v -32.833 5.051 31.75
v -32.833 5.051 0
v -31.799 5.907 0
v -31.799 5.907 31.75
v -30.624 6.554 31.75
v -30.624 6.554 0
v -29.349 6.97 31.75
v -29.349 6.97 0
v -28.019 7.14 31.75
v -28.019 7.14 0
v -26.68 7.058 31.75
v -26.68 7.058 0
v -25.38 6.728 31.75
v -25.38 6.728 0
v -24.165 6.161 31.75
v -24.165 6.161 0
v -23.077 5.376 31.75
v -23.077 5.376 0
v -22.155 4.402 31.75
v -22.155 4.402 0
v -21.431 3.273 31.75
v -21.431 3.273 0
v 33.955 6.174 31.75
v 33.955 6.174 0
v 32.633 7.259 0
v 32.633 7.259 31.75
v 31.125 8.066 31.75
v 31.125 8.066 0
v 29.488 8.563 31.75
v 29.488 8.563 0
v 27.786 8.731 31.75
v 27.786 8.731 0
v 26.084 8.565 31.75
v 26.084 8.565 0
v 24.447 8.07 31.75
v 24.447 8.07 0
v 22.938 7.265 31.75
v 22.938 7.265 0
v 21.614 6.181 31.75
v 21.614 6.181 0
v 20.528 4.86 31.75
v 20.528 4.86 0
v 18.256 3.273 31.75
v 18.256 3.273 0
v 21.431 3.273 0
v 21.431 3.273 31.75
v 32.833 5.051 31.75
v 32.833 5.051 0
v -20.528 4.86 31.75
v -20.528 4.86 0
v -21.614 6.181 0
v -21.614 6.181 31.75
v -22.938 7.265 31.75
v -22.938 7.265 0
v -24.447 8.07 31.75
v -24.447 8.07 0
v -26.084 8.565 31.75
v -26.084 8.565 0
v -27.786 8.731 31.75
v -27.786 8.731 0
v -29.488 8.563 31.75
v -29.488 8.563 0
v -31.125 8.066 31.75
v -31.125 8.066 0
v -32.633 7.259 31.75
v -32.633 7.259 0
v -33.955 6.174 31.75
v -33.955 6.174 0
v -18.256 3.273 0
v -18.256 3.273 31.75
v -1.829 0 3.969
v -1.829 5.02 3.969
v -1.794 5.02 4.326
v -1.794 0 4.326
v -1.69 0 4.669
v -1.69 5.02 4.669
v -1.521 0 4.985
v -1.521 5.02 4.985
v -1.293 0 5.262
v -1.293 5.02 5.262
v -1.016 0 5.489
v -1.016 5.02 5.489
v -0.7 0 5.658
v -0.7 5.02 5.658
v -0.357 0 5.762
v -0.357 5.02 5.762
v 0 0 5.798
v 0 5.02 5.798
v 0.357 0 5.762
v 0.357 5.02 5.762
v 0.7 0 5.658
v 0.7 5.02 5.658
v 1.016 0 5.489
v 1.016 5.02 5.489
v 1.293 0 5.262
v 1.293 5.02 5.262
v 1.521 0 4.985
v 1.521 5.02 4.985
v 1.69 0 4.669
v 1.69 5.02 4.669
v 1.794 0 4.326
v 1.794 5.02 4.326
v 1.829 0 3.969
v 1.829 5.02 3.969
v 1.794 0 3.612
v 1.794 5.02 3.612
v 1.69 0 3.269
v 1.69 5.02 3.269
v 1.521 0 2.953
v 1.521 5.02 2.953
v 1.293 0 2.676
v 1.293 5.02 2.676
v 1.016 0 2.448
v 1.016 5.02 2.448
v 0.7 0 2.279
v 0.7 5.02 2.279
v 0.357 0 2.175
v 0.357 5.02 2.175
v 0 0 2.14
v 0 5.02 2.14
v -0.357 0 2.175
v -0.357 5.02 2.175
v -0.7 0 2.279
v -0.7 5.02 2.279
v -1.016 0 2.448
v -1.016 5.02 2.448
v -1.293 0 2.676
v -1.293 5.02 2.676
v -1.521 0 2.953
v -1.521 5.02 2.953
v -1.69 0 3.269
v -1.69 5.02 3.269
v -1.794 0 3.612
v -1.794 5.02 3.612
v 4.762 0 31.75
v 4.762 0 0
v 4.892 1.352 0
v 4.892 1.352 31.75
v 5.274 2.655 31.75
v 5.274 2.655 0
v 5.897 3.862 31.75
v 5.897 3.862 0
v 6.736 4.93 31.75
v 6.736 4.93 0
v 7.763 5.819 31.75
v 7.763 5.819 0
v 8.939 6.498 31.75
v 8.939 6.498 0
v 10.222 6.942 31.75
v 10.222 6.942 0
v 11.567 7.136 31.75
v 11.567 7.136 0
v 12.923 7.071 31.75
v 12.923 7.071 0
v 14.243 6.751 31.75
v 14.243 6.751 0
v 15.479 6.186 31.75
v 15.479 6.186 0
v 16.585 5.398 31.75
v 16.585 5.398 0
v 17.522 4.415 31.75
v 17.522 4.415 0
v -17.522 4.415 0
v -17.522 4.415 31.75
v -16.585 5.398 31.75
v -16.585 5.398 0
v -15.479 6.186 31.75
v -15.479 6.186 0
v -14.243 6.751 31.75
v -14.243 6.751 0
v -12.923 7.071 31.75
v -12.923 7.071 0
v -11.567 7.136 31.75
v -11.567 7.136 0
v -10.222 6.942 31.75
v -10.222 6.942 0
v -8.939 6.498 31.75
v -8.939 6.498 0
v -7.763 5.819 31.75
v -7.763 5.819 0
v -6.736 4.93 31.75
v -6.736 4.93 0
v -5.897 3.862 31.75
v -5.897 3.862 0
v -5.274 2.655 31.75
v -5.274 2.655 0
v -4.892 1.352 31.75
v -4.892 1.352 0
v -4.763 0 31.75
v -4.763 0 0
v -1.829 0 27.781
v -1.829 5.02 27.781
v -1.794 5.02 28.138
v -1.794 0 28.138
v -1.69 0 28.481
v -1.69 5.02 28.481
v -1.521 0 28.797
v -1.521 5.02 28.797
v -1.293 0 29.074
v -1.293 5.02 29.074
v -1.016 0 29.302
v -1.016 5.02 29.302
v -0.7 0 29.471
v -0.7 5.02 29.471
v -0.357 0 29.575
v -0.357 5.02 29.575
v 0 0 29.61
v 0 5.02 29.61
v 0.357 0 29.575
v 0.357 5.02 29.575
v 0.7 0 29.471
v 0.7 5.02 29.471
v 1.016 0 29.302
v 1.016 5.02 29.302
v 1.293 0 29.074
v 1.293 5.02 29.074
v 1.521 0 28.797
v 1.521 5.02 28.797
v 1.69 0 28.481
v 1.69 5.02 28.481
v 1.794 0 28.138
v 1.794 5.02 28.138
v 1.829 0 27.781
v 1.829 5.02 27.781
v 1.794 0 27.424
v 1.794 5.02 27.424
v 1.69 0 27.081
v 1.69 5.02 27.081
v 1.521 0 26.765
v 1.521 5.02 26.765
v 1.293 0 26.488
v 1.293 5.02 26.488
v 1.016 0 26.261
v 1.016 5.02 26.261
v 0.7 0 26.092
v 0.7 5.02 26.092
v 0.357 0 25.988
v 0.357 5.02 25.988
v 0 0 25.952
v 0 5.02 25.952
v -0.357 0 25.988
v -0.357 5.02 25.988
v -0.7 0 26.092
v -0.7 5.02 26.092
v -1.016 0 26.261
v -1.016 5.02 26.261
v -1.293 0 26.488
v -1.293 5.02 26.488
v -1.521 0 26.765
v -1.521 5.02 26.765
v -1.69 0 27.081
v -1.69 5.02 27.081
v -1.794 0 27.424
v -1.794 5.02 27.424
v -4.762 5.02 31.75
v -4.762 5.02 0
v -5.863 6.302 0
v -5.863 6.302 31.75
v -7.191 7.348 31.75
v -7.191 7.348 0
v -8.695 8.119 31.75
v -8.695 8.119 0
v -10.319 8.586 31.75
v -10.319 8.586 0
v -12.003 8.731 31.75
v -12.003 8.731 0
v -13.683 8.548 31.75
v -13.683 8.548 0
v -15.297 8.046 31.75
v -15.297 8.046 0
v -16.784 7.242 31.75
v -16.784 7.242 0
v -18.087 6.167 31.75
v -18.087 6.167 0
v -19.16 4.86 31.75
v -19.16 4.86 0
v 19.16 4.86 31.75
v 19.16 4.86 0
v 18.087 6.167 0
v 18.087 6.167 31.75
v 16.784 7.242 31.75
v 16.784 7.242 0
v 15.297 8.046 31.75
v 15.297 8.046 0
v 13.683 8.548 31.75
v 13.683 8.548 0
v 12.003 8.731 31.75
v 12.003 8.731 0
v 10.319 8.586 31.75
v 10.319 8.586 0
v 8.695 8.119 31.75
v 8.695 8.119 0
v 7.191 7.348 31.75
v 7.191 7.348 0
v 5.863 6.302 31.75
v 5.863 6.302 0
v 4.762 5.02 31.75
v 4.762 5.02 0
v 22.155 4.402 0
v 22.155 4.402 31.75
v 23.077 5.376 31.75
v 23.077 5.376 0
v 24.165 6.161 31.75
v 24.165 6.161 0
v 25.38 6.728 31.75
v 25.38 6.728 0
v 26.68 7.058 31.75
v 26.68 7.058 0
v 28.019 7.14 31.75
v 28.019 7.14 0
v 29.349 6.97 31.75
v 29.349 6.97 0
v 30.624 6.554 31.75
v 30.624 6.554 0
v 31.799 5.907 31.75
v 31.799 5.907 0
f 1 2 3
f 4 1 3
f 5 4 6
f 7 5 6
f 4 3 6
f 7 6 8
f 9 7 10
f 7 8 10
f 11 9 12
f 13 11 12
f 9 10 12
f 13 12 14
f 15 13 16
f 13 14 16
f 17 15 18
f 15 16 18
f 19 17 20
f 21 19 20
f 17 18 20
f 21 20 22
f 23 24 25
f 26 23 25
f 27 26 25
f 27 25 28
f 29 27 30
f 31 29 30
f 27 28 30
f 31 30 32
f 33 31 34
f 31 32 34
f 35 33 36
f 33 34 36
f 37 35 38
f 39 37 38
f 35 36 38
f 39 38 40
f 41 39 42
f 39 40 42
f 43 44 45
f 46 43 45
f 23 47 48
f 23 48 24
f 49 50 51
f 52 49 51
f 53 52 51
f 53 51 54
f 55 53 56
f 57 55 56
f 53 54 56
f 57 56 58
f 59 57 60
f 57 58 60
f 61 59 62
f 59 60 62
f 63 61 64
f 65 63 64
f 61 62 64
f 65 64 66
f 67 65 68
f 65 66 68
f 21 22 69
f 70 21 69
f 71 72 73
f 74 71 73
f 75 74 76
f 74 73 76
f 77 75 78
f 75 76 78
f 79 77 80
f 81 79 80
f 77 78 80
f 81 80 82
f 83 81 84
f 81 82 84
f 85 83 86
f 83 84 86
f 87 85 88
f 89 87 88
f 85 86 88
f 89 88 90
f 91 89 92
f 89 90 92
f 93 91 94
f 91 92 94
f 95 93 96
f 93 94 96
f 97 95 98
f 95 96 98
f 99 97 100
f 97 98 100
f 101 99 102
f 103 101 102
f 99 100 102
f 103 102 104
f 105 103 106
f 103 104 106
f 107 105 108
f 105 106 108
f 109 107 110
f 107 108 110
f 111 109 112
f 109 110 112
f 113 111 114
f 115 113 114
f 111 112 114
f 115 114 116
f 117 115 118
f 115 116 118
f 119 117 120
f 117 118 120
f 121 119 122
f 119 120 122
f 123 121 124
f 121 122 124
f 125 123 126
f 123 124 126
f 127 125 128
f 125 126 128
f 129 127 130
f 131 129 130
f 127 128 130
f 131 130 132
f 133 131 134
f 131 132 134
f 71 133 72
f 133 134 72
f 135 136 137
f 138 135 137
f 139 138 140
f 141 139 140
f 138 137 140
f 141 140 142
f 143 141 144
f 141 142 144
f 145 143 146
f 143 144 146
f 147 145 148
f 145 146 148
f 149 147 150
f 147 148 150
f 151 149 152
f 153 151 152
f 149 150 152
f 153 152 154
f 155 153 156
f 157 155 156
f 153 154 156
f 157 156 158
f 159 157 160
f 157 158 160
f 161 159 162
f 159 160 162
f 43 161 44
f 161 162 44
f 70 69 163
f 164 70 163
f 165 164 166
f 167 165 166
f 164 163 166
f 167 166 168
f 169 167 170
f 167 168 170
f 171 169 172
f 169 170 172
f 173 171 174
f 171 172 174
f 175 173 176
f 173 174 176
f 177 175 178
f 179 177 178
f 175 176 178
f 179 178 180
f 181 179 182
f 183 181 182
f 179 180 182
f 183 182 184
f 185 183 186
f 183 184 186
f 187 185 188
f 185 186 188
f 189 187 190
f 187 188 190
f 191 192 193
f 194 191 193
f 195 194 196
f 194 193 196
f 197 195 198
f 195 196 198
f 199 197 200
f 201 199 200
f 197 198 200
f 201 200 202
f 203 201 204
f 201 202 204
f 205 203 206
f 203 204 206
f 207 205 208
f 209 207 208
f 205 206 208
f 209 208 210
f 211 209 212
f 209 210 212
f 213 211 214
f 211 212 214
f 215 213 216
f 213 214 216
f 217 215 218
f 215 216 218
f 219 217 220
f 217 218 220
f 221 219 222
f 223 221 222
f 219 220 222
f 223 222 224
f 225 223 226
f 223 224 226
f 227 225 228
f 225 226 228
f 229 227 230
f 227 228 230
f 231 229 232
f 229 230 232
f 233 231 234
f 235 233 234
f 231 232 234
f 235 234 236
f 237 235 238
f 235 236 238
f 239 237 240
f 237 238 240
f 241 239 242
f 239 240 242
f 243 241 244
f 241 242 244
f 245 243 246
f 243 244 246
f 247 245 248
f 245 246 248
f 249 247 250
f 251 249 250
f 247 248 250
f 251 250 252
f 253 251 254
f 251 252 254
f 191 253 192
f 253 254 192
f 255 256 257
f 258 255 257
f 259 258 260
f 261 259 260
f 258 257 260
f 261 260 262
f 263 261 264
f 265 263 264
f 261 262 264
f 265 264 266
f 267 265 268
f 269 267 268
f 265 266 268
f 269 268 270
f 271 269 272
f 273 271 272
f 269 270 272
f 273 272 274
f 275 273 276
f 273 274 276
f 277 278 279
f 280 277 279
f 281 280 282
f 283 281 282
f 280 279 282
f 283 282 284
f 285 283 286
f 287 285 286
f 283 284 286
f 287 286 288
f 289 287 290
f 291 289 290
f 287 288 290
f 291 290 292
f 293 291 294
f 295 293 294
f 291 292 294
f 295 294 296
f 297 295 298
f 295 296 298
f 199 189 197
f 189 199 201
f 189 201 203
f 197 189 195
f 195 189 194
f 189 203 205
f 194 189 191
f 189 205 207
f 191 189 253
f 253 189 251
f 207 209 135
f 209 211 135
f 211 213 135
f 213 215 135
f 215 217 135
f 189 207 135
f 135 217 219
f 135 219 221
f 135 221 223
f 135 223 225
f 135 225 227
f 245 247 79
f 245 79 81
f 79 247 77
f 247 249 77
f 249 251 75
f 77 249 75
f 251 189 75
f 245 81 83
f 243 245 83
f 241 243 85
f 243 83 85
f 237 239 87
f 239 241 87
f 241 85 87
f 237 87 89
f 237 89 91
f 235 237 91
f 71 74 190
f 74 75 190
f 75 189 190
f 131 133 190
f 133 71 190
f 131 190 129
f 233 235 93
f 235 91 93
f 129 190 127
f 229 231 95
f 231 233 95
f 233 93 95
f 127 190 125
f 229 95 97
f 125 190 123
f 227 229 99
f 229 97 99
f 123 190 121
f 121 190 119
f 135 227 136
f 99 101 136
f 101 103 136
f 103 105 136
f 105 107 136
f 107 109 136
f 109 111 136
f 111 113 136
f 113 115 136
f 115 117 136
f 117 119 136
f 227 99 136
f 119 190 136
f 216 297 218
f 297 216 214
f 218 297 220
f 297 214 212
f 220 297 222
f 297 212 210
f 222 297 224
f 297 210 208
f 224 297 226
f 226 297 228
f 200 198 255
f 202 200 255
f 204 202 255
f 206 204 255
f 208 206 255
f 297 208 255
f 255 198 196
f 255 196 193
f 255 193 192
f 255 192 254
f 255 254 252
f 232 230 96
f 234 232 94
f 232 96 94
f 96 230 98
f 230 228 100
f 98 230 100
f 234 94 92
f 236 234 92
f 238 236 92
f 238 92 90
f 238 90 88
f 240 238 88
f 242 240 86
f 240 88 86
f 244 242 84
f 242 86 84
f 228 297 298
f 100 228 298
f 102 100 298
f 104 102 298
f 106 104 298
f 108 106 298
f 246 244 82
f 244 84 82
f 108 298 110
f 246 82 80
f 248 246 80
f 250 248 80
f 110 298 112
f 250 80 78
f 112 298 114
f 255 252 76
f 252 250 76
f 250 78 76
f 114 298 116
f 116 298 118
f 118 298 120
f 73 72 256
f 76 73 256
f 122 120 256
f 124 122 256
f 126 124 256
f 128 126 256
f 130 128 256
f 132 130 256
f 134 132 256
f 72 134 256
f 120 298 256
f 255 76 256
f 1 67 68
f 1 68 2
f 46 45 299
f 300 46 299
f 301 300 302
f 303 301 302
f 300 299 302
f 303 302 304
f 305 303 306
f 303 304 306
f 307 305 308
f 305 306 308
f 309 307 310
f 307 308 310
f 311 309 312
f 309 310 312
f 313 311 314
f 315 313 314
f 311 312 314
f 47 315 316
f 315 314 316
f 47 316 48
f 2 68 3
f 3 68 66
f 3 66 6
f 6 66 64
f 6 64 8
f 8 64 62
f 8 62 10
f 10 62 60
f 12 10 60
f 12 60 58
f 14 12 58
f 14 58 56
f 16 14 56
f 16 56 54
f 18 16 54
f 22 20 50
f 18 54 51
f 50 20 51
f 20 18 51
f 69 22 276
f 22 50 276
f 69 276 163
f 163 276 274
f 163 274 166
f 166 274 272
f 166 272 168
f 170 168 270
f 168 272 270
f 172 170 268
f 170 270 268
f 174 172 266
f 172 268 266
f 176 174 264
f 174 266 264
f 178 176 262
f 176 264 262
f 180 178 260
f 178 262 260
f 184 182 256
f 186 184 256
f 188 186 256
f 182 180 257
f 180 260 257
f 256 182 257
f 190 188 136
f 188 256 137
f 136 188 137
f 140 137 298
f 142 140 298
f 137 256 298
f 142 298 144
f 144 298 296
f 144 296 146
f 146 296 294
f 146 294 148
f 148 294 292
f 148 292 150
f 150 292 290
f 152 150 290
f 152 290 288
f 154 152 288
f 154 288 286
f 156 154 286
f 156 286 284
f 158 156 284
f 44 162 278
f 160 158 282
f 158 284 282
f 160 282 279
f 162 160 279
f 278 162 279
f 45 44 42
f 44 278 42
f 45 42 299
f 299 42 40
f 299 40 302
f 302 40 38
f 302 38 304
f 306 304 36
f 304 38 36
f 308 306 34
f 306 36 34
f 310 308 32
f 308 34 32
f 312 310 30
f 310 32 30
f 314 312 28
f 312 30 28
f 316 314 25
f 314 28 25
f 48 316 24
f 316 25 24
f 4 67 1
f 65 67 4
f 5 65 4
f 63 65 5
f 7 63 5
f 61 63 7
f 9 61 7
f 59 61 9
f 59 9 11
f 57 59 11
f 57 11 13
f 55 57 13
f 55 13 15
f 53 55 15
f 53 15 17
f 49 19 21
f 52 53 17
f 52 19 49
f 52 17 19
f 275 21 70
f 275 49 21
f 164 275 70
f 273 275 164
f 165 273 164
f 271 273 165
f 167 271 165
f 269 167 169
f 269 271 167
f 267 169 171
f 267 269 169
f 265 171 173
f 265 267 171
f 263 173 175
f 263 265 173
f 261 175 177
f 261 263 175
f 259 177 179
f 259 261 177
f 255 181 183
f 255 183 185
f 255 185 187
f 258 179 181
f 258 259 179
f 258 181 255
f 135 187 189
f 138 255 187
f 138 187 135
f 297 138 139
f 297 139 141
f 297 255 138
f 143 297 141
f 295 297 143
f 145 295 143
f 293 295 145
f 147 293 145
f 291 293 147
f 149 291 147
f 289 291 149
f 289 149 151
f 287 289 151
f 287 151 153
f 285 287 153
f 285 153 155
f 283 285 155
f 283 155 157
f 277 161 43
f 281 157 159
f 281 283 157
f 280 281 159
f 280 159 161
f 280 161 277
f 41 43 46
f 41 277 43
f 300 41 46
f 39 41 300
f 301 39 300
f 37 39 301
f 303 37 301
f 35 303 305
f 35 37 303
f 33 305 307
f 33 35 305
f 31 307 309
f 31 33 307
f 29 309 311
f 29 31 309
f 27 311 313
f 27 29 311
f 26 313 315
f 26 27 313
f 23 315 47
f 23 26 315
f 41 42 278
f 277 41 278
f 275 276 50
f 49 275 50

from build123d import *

# Parameters (mm, degrees)
F1_DEPTH = 31.75
F2_R     = 1.8288
F3_DEPTH = 5.020116


with BuildPart() as f1:
    # F0 (on Top) → F1 (new body)
    with BuildSketch(Plane.XY):
        with BuildLine():
            ThreePointArc((-18.25625, 3.272715), (-10.222452, 6.942477), (-4.7625, 0))
            Line((-4.7625, 0), (4.7625, 0))
            ThreePointArc((4.7625, 0), (10.222452, 6.942477), (18.25625, 3.272715))
            Line((18.25625, 3.272715), (21.43125, 3.272715))
            ThreePointArc((21.43125, 3.272715), (26.680106, 7.058374), (32.832644, 5.051394))
            Line((32.832644, 5.051394), (33.955176, 6.173926))
            ThreePointArc((33.955176, 6.173926), (26.931061, 8.689759), (20.527766, 4.860215))
            Line((20.527766, 4.860215), (19.159734, 4.860215))
            ThreePointArc((19.159734, 4.860215), (12.003216, 8.730712), (4.7625, 5.020116))
            Line((4.7625, 5.020116), (-4.7625, 5.020116))
            ThreePointArc((-4.7625, 5.020116), (-12.003216, 8.730712), (-19.159734, 4.860215))
            Line((-19.159734, 4.860215), (-20.527766, 4.860215))
            ThreePointArc((-20.527766, 4.860215), (-26.931061, 8.689759), (-33.955176, 6.173926))
            Line((-33.955176, 6.173926), (-32.832644, 5.051394))
            ThreePointArc((-32.832644, 5.051394), (-26.680106, 7.058374), (-21.43125, 3.272715))
            Line((-21.43125, 3.272715), (-18.25625, 3.272715))
        make_face()
    extrude(amount=F1_DEPTH)

    # F2 (on face) → F3 (cut, through all)
    with BuildSketch(Plane(origin=(0, 5.020116, 0), x_dir=(-1, 0, 0), z_dir=(0, 1, 0))):
        with Locations((0, 3.96875)):
            Circle(F2_R)
        with Locations((0, 27.78125)):
            Circle(F2_R)
    extrude(amount=-F3_DEPTH, mode=Mode.SUBTRACT)


solid = f1.part
